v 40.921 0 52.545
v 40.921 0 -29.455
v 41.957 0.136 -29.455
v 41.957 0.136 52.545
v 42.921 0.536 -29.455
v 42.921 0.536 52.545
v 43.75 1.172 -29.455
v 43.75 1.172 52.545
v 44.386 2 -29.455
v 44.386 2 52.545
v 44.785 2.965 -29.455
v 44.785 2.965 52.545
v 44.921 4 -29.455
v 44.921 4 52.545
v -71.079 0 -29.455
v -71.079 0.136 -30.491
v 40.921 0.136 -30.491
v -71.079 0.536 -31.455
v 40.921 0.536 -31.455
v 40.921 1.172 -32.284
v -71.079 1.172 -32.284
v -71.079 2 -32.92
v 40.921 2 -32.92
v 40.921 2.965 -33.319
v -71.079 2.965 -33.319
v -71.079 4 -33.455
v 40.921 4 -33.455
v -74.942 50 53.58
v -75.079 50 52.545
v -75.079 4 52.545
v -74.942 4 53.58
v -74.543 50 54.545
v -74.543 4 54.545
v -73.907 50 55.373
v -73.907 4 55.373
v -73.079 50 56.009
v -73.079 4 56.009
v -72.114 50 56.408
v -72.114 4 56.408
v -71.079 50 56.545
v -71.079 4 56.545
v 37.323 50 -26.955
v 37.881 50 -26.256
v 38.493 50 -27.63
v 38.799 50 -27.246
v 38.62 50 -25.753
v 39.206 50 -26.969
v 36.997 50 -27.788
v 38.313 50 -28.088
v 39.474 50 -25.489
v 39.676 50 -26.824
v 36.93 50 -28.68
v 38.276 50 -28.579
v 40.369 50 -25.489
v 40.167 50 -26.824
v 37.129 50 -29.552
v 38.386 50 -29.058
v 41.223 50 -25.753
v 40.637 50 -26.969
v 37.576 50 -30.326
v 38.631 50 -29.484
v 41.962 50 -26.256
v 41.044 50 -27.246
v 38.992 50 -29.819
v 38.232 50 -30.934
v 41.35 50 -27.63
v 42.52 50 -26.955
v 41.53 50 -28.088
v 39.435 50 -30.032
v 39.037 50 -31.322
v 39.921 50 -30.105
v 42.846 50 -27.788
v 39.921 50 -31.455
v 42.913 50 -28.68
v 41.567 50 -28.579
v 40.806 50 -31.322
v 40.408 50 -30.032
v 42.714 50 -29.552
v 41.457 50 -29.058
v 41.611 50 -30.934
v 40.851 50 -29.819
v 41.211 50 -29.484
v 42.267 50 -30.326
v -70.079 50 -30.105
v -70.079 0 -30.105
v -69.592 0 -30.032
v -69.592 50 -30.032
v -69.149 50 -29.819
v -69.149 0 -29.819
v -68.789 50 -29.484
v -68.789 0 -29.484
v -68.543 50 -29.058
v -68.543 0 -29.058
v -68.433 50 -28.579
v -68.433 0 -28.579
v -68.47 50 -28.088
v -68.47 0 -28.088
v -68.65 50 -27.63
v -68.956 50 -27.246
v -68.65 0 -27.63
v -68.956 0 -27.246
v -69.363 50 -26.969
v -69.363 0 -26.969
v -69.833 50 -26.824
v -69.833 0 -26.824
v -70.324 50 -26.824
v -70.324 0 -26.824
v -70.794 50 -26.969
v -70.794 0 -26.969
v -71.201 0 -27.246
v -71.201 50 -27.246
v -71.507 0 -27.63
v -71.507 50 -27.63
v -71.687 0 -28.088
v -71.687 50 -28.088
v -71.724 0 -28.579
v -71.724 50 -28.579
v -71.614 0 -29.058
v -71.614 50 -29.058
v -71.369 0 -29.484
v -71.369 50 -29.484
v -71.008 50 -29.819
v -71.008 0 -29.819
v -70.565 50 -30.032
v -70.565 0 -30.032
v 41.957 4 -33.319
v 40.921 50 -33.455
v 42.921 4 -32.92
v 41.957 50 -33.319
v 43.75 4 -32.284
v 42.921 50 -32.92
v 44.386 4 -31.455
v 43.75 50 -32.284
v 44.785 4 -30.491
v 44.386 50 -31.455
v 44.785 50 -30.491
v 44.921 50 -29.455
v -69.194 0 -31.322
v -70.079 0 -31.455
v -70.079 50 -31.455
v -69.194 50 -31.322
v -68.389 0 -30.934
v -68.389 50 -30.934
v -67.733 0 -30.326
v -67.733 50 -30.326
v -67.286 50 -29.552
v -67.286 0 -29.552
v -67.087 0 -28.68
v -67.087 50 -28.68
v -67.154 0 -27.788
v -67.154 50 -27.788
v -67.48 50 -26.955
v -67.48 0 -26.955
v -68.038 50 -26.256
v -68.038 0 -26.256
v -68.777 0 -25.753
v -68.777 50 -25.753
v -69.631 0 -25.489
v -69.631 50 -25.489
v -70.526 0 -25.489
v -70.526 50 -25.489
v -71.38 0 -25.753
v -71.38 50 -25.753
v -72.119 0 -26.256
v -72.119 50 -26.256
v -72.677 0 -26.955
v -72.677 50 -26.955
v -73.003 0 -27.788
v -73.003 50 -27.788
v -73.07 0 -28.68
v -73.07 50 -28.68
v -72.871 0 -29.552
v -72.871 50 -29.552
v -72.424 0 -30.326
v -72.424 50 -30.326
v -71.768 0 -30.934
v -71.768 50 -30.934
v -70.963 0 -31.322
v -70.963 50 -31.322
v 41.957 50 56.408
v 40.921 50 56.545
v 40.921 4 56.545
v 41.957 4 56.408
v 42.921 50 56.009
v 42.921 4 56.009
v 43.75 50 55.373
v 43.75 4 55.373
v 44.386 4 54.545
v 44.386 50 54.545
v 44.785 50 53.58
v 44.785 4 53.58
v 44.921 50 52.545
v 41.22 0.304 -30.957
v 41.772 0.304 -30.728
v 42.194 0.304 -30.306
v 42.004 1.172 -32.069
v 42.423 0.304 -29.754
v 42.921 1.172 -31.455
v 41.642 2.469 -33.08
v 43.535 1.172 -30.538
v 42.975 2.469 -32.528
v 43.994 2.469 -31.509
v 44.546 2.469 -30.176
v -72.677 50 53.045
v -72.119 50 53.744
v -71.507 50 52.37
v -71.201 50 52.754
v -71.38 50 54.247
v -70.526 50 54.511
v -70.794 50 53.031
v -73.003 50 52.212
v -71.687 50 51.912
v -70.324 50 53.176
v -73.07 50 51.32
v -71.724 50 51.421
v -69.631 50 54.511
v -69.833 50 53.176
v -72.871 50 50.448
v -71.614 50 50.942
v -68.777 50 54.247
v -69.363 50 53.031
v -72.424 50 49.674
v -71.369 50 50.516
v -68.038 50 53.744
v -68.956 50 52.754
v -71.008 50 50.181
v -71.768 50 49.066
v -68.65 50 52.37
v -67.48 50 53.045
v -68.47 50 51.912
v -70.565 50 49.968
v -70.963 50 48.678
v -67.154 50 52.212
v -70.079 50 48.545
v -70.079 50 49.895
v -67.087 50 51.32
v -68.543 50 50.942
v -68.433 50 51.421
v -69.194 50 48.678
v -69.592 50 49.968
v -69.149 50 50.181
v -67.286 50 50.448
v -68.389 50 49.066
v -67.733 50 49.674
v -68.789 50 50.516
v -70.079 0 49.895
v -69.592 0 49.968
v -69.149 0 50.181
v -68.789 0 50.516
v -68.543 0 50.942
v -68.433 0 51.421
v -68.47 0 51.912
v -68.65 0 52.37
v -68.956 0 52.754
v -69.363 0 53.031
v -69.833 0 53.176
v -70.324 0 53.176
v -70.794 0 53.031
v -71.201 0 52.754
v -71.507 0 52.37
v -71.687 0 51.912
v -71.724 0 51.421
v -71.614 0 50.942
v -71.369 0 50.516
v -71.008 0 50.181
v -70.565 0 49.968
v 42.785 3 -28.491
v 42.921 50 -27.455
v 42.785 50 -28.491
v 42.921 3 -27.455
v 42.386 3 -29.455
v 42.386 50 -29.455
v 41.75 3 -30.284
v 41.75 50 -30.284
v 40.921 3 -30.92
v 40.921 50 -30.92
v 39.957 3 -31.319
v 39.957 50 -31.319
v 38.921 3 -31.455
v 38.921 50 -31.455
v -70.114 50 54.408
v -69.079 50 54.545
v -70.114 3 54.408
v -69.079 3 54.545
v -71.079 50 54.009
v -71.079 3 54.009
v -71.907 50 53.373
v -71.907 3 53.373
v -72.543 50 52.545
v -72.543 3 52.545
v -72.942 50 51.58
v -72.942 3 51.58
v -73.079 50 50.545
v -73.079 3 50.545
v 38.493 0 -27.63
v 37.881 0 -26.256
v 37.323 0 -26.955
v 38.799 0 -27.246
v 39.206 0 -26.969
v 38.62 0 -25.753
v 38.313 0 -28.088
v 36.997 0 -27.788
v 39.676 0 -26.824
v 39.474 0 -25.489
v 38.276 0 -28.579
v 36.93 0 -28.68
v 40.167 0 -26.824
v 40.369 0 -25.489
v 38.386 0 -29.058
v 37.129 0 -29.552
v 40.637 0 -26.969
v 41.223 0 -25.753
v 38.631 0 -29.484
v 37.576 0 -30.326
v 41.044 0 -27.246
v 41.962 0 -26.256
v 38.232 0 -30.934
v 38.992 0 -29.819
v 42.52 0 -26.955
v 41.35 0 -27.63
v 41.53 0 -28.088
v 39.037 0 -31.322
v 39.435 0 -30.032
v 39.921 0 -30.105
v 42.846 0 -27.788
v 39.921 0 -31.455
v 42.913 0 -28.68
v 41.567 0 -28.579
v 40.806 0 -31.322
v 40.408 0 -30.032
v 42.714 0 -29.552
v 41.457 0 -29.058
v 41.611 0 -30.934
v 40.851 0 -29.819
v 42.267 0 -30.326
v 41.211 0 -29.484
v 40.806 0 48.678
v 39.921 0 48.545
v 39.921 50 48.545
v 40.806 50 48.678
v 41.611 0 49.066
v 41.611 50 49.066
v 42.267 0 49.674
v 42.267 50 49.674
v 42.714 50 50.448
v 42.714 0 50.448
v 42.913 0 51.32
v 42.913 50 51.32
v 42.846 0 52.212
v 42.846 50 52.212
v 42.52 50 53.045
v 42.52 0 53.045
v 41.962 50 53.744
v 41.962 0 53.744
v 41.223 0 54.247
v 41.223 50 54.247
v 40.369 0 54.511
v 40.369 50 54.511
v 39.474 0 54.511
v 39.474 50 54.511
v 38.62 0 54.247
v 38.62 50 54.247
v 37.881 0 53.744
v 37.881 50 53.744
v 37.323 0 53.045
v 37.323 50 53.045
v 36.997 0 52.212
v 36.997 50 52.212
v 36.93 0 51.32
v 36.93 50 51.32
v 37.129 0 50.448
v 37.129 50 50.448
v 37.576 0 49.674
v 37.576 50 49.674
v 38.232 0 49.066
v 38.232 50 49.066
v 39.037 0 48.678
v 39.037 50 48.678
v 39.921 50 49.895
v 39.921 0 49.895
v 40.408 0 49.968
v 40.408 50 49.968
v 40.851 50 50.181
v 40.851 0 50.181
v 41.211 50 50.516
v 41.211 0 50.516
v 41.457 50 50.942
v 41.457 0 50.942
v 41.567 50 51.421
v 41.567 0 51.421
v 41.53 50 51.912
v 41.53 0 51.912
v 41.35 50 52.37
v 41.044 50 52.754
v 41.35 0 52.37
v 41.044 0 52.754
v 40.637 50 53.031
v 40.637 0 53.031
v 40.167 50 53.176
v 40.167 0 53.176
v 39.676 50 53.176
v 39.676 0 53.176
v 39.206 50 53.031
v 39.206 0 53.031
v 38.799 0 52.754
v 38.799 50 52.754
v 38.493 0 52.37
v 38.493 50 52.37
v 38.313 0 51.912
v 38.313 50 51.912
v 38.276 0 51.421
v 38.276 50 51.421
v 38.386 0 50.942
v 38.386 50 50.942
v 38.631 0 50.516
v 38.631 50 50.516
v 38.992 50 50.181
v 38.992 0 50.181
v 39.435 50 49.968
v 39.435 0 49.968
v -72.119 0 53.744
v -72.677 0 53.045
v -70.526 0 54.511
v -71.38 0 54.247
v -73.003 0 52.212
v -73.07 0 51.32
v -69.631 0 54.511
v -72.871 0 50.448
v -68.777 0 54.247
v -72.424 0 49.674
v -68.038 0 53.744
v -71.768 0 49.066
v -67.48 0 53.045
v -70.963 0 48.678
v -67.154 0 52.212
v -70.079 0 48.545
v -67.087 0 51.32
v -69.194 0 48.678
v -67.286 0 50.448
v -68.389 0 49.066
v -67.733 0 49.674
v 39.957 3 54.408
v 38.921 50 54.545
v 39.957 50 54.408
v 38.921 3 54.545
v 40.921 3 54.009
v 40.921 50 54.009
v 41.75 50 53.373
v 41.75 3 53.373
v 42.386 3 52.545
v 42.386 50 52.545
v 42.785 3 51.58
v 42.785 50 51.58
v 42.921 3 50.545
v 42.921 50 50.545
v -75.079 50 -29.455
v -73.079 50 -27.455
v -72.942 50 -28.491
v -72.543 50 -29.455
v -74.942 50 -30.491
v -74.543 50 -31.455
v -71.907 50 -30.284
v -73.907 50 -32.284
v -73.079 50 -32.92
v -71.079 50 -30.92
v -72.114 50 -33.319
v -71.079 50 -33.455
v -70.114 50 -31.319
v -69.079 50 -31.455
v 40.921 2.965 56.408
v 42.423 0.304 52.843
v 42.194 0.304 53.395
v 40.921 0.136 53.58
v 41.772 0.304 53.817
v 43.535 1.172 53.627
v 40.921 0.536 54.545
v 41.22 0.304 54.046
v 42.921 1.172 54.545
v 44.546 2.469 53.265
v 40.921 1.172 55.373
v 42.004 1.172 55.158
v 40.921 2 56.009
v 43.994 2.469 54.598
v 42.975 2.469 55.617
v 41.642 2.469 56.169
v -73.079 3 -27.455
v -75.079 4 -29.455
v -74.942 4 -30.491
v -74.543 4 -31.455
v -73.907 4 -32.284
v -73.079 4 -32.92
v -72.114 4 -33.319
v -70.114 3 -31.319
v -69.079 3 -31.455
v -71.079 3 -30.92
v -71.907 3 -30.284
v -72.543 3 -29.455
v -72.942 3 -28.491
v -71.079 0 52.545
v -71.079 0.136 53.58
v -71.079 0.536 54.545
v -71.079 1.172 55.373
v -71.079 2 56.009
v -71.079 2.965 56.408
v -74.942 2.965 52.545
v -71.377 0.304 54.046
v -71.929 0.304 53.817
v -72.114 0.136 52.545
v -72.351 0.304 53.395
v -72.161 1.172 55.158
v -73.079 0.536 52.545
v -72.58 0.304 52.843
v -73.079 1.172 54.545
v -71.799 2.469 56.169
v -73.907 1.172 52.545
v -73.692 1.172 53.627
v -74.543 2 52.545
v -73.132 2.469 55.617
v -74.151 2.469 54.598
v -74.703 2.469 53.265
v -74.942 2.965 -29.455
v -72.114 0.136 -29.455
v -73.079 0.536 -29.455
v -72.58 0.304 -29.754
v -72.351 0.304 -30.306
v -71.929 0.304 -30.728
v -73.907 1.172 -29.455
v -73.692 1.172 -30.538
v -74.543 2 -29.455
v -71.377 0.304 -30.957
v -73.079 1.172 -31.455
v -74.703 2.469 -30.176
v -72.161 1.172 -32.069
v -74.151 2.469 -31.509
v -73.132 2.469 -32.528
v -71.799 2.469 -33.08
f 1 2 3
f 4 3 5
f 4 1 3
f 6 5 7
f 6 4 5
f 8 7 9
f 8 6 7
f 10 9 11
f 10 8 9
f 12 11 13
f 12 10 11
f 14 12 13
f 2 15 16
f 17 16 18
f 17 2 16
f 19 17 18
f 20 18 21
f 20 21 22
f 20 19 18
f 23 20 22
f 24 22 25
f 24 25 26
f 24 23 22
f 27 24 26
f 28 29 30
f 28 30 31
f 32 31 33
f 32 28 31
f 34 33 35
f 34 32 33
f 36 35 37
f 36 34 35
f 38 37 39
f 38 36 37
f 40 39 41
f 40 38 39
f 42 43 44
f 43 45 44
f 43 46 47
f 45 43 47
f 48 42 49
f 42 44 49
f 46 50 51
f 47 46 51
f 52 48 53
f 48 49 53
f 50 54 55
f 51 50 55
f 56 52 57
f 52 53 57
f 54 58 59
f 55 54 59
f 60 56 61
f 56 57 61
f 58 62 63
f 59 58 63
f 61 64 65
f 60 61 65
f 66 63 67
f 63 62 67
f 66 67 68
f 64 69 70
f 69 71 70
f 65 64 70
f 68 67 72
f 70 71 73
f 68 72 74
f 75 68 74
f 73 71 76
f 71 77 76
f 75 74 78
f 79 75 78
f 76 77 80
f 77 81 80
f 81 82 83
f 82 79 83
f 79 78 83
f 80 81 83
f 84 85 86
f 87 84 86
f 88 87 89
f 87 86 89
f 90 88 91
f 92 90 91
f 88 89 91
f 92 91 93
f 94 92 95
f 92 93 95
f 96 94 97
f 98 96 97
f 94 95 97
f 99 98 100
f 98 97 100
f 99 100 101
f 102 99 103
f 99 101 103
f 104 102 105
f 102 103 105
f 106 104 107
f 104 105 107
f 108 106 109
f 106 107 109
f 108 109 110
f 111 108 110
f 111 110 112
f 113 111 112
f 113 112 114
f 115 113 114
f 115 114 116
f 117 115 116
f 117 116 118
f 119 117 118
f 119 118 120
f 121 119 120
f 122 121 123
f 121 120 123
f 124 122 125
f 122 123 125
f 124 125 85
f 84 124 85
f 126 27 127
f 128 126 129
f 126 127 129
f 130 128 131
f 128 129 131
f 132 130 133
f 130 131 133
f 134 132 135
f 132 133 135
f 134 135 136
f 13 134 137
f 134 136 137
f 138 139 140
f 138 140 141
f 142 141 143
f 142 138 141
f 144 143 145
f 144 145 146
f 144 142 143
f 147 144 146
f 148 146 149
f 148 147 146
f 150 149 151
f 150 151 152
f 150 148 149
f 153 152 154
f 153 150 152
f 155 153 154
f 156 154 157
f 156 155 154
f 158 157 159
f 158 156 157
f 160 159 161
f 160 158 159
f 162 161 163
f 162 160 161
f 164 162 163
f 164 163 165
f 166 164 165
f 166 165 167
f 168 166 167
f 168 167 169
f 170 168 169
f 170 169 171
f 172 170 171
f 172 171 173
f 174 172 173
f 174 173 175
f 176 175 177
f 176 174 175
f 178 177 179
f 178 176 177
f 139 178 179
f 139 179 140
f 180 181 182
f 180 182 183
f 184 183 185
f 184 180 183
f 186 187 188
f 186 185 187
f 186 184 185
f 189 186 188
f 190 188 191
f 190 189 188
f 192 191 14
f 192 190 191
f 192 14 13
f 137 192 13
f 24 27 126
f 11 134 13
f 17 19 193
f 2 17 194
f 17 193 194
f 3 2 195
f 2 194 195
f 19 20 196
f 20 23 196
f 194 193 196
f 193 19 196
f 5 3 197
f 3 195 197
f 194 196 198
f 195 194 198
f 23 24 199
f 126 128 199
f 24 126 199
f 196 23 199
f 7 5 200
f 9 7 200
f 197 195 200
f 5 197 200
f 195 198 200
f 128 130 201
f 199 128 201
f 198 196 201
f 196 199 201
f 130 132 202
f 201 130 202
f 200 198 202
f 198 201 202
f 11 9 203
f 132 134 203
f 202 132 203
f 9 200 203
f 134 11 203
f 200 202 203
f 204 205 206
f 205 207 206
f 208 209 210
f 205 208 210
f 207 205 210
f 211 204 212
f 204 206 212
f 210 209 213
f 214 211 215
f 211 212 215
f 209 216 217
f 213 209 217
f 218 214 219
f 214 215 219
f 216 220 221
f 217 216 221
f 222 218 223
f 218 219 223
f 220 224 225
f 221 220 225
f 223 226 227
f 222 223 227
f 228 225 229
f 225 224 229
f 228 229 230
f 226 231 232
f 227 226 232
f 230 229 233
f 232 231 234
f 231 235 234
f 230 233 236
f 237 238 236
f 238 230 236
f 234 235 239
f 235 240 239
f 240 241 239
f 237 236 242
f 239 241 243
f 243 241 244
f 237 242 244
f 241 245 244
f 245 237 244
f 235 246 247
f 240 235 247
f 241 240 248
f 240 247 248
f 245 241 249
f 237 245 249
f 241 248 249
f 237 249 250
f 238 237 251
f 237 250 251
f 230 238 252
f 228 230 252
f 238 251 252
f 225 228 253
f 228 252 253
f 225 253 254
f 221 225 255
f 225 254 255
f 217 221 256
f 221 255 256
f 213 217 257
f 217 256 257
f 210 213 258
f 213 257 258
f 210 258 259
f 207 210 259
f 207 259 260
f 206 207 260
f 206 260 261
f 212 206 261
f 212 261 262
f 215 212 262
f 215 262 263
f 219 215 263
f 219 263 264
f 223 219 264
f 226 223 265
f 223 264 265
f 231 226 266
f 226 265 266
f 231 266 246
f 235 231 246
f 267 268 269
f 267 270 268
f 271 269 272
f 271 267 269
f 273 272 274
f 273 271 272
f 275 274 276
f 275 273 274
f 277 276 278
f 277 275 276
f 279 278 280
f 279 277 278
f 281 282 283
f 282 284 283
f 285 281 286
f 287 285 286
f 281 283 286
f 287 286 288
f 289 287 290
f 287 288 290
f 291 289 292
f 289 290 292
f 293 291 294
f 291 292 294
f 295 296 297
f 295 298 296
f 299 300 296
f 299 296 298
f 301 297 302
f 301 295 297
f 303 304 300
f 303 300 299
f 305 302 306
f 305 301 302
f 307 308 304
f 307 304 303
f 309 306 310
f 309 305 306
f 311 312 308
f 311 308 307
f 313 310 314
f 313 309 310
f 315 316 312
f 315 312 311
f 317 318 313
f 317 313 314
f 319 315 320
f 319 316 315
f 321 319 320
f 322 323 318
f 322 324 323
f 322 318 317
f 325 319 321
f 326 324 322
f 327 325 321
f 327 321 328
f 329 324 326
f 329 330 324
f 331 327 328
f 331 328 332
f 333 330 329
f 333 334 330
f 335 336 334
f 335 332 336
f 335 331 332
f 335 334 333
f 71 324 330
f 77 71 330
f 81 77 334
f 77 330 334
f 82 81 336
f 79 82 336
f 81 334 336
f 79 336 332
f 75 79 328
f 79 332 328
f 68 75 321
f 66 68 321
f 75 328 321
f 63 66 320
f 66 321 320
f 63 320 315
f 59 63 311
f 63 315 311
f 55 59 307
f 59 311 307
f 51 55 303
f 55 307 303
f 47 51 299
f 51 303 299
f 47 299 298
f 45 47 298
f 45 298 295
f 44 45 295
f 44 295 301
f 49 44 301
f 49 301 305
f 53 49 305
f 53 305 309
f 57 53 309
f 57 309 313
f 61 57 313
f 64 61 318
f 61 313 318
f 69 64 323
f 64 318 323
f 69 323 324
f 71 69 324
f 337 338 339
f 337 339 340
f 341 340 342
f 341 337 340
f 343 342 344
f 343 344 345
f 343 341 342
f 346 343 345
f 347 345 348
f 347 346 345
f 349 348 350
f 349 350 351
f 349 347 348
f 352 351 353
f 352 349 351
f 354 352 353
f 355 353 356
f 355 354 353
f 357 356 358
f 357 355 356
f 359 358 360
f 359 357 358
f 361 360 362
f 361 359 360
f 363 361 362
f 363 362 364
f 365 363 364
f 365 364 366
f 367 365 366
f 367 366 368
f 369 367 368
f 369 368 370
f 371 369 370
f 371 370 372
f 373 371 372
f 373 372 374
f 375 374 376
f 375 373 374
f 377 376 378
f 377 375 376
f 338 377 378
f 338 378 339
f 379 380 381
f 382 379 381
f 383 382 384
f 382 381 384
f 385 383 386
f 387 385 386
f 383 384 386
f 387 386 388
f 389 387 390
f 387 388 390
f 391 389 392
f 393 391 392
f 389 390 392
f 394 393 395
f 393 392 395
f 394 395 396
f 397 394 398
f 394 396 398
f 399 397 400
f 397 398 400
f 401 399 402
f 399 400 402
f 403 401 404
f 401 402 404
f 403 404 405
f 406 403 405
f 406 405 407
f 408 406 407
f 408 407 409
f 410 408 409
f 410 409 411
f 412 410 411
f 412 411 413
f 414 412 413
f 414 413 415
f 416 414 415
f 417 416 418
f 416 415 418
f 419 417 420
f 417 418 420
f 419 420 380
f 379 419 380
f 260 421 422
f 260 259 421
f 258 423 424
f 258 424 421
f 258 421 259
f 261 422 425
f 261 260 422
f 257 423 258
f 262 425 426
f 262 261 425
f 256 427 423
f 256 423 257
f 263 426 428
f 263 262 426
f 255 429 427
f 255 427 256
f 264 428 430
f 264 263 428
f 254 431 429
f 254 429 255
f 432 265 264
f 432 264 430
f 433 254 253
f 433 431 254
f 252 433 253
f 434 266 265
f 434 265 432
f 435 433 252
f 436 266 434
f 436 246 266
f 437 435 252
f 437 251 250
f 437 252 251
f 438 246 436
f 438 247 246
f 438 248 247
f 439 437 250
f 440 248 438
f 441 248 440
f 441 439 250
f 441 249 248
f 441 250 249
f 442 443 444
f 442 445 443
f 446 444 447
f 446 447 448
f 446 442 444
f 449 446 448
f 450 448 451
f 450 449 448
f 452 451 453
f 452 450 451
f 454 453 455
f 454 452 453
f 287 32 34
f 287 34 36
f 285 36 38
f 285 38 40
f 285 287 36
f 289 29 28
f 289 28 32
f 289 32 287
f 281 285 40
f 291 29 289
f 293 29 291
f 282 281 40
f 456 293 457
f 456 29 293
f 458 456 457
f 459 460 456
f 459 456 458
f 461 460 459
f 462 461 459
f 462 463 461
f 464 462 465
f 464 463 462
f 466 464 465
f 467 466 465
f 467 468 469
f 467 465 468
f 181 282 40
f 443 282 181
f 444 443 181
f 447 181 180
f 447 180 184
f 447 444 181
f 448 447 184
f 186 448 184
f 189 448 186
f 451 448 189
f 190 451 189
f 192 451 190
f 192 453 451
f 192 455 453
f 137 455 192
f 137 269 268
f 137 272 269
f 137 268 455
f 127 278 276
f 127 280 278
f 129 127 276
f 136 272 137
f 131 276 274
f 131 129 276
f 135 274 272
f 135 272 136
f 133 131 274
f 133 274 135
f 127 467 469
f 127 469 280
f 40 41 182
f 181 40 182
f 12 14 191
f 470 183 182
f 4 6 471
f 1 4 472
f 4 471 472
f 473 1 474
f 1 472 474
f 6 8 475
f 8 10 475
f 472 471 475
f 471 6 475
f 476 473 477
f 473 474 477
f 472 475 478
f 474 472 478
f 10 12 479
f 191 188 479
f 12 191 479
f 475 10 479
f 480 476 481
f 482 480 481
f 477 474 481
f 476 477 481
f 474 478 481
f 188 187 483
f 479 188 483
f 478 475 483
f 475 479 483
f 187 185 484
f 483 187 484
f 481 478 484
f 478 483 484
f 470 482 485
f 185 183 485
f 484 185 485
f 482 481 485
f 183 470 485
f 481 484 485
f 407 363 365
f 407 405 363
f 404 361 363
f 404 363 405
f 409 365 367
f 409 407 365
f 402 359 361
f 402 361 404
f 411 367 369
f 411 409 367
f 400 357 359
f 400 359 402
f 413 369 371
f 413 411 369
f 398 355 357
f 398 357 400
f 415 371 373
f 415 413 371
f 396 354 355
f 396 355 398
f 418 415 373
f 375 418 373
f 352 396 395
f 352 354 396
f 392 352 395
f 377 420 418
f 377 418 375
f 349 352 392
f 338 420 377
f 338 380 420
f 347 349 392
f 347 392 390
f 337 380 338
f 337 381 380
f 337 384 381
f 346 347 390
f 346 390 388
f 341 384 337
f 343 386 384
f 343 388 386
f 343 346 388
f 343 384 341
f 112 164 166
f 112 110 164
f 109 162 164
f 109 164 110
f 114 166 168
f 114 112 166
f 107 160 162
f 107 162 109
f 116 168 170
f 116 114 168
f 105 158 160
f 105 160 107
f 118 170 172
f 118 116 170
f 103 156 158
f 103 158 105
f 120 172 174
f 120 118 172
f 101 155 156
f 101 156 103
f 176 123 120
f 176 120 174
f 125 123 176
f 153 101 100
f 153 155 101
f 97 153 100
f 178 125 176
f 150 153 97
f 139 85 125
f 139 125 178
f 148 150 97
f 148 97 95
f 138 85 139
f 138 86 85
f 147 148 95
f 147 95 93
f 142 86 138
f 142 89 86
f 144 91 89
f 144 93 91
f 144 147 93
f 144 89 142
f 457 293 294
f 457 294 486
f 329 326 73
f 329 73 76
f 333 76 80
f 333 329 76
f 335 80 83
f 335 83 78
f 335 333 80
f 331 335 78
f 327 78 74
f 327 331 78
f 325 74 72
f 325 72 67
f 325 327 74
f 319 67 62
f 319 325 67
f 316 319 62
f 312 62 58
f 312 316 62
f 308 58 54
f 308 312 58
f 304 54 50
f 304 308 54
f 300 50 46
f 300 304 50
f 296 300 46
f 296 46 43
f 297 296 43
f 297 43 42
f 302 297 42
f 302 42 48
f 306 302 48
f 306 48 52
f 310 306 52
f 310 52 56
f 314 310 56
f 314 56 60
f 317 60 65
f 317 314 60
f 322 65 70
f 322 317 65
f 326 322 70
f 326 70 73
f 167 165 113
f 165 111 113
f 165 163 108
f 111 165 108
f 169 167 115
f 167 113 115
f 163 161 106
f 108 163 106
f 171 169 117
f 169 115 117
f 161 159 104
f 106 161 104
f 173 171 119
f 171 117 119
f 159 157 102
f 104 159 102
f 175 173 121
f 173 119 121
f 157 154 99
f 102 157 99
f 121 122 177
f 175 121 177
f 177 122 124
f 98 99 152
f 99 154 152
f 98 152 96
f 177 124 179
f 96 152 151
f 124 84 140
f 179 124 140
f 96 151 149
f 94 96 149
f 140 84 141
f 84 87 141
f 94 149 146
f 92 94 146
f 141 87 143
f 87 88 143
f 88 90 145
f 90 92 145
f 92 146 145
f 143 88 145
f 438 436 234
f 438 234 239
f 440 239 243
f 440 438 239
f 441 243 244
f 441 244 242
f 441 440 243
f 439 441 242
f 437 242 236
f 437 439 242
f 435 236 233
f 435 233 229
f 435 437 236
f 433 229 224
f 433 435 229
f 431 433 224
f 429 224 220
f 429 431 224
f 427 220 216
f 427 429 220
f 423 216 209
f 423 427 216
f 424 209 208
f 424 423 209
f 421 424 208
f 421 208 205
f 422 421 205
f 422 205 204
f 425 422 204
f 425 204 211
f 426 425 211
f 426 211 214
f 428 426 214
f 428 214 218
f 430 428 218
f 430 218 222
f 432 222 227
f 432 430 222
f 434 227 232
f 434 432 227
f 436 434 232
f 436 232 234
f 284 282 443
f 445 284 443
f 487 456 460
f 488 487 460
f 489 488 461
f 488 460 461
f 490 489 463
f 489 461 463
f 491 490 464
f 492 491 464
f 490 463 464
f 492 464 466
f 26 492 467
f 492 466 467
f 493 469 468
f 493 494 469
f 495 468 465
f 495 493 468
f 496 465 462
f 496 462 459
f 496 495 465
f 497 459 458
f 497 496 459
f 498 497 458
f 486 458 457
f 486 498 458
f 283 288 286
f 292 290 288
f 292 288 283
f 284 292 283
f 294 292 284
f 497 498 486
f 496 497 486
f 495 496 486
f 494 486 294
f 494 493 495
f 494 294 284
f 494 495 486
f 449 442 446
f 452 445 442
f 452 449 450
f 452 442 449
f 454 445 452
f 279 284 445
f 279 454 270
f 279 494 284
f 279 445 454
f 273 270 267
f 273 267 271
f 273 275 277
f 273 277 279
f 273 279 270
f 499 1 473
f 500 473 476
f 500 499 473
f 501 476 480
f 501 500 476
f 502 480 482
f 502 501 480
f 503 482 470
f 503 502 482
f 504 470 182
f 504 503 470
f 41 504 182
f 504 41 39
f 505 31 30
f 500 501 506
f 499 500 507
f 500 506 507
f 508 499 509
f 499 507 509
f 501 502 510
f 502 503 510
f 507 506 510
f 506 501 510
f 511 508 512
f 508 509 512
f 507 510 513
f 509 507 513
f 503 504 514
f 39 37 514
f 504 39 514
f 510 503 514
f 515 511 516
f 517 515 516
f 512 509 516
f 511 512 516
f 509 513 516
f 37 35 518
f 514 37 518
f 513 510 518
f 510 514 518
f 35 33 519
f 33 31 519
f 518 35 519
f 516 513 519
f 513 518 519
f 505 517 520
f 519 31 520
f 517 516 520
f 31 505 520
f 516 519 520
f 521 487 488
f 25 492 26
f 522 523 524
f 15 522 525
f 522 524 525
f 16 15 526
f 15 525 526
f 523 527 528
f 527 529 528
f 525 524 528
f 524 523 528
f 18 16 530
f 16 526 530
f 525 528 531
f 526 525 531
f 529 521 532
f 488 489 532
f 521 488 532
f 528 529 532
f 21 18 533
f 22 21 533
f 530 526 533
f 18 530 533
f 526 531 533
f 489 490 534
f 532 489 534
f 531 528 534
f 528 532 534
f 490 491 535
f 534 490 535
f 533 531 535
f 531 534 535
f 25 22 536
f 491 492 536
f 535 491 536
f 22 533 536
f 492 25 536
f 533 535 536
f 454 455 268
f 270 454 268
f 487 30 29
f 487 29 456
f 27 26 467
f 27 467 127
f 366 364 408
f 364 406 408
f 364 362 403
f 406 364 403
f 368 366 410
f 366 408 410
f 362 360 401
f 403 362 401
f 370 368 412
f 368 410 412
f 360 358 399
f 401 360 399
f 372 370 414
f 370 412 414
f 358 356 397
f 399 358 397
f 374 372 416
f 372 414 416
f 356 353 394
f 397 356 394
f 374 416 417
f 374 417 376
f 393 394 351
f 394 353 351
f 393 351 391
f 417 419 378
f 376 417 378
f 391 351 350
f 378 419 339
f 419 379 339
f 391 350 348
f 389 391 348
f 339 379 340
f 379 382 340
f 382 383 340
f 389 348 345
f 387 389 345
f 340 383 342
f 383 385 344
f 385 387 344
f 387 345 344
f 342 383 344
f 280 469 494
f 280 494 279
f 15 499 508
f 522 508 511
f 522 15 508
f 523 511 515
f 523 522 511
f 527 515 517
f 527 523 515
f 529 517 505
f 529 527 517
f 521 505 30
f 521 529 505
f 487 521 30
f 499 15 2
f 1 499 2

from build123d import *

# Parameters (mm, degrees)
SKETCH1_W             = 120
SKETCH1_H             = 90
BOSS_EXTRUDE1_DEPTH   = 50
SKETCH2_W             = 116
SKETCH2_H             = 86
CUT_EXTRUDE1_DEPTH    = 47
SKETCH5_R             = 3
SKETCH5_R_2           = 1.65
BOSS_EXTRUDE5_DEPTH   = 50
BOSS_EXTRUDE5_2_DEPTH = 50
BOSS_EXTRUDE5_3_DEPTH = 50
BOSS_EXTRUDE5_4_DEPTH = 50
FILLET1_R             = 4
FILLET2_R             = 4
FILLET3_R             = 4


with BuildPart() as part:
    # Sketch1 → Boss-Extrude1 (new body)
    with BuildSketch(Plane(origin=(0, 0, 0), x_dir=(1, 0, 0), z_dir=(0, 1, 0))):
        with Locations((-15.078534031, -11.544502618)):
            Rectangle(SKETCH1_W, SKETCH1_H)
    extrude(amount=BOSS_EXTRUDE1_DEPTH)

    # Sketch2 → Cut-Extrude1 (cut)
    with BuildSketch(Plane(origin=(0, 50, 0), x_dir=(1, 0, 0), z_dir=(0, 1, 0))):
        with Locations((-15.078534031, -11.544502618)):
            Rectangle(SKETCH2_W, SKETCH2_H)
    extrude(amount=-CUT_EXTRUDE1_DEPTH, mode=Mode.SUBTRACT)

    # Fillet1
    fillet1_edges = [part.edges().sort_by_distance(p)[0] for p in [
        (-75.078534031, 25, -33.455497382),
        (44.921465969, 25, -33.455497382),
        (44.921465969, 25, 56.544502618),
        (-75.078534031, 25, 56.544502618),
    ]]
    fillet(fillet1_edges, radius=FILLET1_R)

    # Fillet2
    fillet2_edges = [part.edges().sort_by_distance(p)[0] for p in [
        (-15.078534031, 0, -33.455497382),
        (-75.078534031, 0, 11.544502618),
        (44.921465969, 0, 11.544502618),
        (-15.078534031, 0, 56.544502618),
        (-73.906961156, 0, -32.283924507),
        (-73.906961156, 0, 55.372929743),
        (43.749893093, 0, 55.372929743),
        (43.749893093, 0, -32.283924507),
    ]]
    fillet(fillet2_edges, radius=FILLET2_R)

    # Fillet3
    fillet3_edges = [part.edges().sort_by_distance(p)[0] for p in [
        (-73.078534031, 26.5, 54.544502618),
        (-73.078534031, 26.5, -31.455497382),
        (42.921465969, 26.5, -31.455497382),
        (42.921465969, 26.5, 54.544502618),
    ]]
    fillet(fillet3_edges, radius=FILLET3_R)


with BuildPart() as body_2:
    # Sketch5 → Boss-Extrude5 (new body)
    with BuildSketch(Plane.XZ):
        with Locations(Location((39.921465969, 51.544502618, 0), (0, 0, 270))):
            Circle(SKETCH5_R)
        with Locations(Location((39.921465969, 51.544502618, 0), (0, 0, 270))):
            Circle(SKETCH5_R_2, mode=Mode.SUBTRACT)
    extrude(amount=-BOSS_EXTRUDE5_DEPTH)


with BuildPart() as body_3:
    # Sketch5 → Boss-Extrude5 2 (new body)
    with BuildSketch(Plane.XZ):
        with Locations(Location((-70.078534031, -28.455497382, 0), (0, 0, 270))):
            Circle(SKETCH5_R)
        with Locations(Location((-70.078534031, -28.455497382, 0), (0, 0, 270))):
            Circle(SKETCH5_R_2, mode=Mode.SUBTRACT)
    extrude(amount=-BOSS_EXTRUDE5_2_DEPTH)


with BuildPart() as body_4:
    # Sketch5 → Boss-Extrude5 3 (new body)
    with BuildSketch(Plane.XZ):
        with Locations(Location((-70.078534031, 51.544502618, 0), (0, 0, 270))):
            Circle(SKETCH5_R)
        with Locations(Location((-70.078534031, 51.544502618, 0), (0, 0, 270))):
            Circle(SKETCH5_R_2, mode=Mode.SUBTRACT)
    extrude(amount=-BOSS_EXTRUDE5_3_DEPTH)


with BuildPart() as body_5:
    # Sketch5 → Boss-Extrude5 4 (new body)
    with BuildSketch(Plane.XZ):
        with Locations(Location((39.921465969, -28.455497382, 0), (0, 0, 270))):
            Circle(SKETCH5_R)
        with Locations(Location((39.921465969, -28.455497382, 0), (0, 0, 270))):
            Circle(SKETCH5_R_2, mode=Mode.SUBTRACT)
    extrude(amount=-BOSS_EXTRUDE5_4_DEPTH)


solid = Compound([part.part, body_2.part, body_3.part, body_4.part, body_5.part])
